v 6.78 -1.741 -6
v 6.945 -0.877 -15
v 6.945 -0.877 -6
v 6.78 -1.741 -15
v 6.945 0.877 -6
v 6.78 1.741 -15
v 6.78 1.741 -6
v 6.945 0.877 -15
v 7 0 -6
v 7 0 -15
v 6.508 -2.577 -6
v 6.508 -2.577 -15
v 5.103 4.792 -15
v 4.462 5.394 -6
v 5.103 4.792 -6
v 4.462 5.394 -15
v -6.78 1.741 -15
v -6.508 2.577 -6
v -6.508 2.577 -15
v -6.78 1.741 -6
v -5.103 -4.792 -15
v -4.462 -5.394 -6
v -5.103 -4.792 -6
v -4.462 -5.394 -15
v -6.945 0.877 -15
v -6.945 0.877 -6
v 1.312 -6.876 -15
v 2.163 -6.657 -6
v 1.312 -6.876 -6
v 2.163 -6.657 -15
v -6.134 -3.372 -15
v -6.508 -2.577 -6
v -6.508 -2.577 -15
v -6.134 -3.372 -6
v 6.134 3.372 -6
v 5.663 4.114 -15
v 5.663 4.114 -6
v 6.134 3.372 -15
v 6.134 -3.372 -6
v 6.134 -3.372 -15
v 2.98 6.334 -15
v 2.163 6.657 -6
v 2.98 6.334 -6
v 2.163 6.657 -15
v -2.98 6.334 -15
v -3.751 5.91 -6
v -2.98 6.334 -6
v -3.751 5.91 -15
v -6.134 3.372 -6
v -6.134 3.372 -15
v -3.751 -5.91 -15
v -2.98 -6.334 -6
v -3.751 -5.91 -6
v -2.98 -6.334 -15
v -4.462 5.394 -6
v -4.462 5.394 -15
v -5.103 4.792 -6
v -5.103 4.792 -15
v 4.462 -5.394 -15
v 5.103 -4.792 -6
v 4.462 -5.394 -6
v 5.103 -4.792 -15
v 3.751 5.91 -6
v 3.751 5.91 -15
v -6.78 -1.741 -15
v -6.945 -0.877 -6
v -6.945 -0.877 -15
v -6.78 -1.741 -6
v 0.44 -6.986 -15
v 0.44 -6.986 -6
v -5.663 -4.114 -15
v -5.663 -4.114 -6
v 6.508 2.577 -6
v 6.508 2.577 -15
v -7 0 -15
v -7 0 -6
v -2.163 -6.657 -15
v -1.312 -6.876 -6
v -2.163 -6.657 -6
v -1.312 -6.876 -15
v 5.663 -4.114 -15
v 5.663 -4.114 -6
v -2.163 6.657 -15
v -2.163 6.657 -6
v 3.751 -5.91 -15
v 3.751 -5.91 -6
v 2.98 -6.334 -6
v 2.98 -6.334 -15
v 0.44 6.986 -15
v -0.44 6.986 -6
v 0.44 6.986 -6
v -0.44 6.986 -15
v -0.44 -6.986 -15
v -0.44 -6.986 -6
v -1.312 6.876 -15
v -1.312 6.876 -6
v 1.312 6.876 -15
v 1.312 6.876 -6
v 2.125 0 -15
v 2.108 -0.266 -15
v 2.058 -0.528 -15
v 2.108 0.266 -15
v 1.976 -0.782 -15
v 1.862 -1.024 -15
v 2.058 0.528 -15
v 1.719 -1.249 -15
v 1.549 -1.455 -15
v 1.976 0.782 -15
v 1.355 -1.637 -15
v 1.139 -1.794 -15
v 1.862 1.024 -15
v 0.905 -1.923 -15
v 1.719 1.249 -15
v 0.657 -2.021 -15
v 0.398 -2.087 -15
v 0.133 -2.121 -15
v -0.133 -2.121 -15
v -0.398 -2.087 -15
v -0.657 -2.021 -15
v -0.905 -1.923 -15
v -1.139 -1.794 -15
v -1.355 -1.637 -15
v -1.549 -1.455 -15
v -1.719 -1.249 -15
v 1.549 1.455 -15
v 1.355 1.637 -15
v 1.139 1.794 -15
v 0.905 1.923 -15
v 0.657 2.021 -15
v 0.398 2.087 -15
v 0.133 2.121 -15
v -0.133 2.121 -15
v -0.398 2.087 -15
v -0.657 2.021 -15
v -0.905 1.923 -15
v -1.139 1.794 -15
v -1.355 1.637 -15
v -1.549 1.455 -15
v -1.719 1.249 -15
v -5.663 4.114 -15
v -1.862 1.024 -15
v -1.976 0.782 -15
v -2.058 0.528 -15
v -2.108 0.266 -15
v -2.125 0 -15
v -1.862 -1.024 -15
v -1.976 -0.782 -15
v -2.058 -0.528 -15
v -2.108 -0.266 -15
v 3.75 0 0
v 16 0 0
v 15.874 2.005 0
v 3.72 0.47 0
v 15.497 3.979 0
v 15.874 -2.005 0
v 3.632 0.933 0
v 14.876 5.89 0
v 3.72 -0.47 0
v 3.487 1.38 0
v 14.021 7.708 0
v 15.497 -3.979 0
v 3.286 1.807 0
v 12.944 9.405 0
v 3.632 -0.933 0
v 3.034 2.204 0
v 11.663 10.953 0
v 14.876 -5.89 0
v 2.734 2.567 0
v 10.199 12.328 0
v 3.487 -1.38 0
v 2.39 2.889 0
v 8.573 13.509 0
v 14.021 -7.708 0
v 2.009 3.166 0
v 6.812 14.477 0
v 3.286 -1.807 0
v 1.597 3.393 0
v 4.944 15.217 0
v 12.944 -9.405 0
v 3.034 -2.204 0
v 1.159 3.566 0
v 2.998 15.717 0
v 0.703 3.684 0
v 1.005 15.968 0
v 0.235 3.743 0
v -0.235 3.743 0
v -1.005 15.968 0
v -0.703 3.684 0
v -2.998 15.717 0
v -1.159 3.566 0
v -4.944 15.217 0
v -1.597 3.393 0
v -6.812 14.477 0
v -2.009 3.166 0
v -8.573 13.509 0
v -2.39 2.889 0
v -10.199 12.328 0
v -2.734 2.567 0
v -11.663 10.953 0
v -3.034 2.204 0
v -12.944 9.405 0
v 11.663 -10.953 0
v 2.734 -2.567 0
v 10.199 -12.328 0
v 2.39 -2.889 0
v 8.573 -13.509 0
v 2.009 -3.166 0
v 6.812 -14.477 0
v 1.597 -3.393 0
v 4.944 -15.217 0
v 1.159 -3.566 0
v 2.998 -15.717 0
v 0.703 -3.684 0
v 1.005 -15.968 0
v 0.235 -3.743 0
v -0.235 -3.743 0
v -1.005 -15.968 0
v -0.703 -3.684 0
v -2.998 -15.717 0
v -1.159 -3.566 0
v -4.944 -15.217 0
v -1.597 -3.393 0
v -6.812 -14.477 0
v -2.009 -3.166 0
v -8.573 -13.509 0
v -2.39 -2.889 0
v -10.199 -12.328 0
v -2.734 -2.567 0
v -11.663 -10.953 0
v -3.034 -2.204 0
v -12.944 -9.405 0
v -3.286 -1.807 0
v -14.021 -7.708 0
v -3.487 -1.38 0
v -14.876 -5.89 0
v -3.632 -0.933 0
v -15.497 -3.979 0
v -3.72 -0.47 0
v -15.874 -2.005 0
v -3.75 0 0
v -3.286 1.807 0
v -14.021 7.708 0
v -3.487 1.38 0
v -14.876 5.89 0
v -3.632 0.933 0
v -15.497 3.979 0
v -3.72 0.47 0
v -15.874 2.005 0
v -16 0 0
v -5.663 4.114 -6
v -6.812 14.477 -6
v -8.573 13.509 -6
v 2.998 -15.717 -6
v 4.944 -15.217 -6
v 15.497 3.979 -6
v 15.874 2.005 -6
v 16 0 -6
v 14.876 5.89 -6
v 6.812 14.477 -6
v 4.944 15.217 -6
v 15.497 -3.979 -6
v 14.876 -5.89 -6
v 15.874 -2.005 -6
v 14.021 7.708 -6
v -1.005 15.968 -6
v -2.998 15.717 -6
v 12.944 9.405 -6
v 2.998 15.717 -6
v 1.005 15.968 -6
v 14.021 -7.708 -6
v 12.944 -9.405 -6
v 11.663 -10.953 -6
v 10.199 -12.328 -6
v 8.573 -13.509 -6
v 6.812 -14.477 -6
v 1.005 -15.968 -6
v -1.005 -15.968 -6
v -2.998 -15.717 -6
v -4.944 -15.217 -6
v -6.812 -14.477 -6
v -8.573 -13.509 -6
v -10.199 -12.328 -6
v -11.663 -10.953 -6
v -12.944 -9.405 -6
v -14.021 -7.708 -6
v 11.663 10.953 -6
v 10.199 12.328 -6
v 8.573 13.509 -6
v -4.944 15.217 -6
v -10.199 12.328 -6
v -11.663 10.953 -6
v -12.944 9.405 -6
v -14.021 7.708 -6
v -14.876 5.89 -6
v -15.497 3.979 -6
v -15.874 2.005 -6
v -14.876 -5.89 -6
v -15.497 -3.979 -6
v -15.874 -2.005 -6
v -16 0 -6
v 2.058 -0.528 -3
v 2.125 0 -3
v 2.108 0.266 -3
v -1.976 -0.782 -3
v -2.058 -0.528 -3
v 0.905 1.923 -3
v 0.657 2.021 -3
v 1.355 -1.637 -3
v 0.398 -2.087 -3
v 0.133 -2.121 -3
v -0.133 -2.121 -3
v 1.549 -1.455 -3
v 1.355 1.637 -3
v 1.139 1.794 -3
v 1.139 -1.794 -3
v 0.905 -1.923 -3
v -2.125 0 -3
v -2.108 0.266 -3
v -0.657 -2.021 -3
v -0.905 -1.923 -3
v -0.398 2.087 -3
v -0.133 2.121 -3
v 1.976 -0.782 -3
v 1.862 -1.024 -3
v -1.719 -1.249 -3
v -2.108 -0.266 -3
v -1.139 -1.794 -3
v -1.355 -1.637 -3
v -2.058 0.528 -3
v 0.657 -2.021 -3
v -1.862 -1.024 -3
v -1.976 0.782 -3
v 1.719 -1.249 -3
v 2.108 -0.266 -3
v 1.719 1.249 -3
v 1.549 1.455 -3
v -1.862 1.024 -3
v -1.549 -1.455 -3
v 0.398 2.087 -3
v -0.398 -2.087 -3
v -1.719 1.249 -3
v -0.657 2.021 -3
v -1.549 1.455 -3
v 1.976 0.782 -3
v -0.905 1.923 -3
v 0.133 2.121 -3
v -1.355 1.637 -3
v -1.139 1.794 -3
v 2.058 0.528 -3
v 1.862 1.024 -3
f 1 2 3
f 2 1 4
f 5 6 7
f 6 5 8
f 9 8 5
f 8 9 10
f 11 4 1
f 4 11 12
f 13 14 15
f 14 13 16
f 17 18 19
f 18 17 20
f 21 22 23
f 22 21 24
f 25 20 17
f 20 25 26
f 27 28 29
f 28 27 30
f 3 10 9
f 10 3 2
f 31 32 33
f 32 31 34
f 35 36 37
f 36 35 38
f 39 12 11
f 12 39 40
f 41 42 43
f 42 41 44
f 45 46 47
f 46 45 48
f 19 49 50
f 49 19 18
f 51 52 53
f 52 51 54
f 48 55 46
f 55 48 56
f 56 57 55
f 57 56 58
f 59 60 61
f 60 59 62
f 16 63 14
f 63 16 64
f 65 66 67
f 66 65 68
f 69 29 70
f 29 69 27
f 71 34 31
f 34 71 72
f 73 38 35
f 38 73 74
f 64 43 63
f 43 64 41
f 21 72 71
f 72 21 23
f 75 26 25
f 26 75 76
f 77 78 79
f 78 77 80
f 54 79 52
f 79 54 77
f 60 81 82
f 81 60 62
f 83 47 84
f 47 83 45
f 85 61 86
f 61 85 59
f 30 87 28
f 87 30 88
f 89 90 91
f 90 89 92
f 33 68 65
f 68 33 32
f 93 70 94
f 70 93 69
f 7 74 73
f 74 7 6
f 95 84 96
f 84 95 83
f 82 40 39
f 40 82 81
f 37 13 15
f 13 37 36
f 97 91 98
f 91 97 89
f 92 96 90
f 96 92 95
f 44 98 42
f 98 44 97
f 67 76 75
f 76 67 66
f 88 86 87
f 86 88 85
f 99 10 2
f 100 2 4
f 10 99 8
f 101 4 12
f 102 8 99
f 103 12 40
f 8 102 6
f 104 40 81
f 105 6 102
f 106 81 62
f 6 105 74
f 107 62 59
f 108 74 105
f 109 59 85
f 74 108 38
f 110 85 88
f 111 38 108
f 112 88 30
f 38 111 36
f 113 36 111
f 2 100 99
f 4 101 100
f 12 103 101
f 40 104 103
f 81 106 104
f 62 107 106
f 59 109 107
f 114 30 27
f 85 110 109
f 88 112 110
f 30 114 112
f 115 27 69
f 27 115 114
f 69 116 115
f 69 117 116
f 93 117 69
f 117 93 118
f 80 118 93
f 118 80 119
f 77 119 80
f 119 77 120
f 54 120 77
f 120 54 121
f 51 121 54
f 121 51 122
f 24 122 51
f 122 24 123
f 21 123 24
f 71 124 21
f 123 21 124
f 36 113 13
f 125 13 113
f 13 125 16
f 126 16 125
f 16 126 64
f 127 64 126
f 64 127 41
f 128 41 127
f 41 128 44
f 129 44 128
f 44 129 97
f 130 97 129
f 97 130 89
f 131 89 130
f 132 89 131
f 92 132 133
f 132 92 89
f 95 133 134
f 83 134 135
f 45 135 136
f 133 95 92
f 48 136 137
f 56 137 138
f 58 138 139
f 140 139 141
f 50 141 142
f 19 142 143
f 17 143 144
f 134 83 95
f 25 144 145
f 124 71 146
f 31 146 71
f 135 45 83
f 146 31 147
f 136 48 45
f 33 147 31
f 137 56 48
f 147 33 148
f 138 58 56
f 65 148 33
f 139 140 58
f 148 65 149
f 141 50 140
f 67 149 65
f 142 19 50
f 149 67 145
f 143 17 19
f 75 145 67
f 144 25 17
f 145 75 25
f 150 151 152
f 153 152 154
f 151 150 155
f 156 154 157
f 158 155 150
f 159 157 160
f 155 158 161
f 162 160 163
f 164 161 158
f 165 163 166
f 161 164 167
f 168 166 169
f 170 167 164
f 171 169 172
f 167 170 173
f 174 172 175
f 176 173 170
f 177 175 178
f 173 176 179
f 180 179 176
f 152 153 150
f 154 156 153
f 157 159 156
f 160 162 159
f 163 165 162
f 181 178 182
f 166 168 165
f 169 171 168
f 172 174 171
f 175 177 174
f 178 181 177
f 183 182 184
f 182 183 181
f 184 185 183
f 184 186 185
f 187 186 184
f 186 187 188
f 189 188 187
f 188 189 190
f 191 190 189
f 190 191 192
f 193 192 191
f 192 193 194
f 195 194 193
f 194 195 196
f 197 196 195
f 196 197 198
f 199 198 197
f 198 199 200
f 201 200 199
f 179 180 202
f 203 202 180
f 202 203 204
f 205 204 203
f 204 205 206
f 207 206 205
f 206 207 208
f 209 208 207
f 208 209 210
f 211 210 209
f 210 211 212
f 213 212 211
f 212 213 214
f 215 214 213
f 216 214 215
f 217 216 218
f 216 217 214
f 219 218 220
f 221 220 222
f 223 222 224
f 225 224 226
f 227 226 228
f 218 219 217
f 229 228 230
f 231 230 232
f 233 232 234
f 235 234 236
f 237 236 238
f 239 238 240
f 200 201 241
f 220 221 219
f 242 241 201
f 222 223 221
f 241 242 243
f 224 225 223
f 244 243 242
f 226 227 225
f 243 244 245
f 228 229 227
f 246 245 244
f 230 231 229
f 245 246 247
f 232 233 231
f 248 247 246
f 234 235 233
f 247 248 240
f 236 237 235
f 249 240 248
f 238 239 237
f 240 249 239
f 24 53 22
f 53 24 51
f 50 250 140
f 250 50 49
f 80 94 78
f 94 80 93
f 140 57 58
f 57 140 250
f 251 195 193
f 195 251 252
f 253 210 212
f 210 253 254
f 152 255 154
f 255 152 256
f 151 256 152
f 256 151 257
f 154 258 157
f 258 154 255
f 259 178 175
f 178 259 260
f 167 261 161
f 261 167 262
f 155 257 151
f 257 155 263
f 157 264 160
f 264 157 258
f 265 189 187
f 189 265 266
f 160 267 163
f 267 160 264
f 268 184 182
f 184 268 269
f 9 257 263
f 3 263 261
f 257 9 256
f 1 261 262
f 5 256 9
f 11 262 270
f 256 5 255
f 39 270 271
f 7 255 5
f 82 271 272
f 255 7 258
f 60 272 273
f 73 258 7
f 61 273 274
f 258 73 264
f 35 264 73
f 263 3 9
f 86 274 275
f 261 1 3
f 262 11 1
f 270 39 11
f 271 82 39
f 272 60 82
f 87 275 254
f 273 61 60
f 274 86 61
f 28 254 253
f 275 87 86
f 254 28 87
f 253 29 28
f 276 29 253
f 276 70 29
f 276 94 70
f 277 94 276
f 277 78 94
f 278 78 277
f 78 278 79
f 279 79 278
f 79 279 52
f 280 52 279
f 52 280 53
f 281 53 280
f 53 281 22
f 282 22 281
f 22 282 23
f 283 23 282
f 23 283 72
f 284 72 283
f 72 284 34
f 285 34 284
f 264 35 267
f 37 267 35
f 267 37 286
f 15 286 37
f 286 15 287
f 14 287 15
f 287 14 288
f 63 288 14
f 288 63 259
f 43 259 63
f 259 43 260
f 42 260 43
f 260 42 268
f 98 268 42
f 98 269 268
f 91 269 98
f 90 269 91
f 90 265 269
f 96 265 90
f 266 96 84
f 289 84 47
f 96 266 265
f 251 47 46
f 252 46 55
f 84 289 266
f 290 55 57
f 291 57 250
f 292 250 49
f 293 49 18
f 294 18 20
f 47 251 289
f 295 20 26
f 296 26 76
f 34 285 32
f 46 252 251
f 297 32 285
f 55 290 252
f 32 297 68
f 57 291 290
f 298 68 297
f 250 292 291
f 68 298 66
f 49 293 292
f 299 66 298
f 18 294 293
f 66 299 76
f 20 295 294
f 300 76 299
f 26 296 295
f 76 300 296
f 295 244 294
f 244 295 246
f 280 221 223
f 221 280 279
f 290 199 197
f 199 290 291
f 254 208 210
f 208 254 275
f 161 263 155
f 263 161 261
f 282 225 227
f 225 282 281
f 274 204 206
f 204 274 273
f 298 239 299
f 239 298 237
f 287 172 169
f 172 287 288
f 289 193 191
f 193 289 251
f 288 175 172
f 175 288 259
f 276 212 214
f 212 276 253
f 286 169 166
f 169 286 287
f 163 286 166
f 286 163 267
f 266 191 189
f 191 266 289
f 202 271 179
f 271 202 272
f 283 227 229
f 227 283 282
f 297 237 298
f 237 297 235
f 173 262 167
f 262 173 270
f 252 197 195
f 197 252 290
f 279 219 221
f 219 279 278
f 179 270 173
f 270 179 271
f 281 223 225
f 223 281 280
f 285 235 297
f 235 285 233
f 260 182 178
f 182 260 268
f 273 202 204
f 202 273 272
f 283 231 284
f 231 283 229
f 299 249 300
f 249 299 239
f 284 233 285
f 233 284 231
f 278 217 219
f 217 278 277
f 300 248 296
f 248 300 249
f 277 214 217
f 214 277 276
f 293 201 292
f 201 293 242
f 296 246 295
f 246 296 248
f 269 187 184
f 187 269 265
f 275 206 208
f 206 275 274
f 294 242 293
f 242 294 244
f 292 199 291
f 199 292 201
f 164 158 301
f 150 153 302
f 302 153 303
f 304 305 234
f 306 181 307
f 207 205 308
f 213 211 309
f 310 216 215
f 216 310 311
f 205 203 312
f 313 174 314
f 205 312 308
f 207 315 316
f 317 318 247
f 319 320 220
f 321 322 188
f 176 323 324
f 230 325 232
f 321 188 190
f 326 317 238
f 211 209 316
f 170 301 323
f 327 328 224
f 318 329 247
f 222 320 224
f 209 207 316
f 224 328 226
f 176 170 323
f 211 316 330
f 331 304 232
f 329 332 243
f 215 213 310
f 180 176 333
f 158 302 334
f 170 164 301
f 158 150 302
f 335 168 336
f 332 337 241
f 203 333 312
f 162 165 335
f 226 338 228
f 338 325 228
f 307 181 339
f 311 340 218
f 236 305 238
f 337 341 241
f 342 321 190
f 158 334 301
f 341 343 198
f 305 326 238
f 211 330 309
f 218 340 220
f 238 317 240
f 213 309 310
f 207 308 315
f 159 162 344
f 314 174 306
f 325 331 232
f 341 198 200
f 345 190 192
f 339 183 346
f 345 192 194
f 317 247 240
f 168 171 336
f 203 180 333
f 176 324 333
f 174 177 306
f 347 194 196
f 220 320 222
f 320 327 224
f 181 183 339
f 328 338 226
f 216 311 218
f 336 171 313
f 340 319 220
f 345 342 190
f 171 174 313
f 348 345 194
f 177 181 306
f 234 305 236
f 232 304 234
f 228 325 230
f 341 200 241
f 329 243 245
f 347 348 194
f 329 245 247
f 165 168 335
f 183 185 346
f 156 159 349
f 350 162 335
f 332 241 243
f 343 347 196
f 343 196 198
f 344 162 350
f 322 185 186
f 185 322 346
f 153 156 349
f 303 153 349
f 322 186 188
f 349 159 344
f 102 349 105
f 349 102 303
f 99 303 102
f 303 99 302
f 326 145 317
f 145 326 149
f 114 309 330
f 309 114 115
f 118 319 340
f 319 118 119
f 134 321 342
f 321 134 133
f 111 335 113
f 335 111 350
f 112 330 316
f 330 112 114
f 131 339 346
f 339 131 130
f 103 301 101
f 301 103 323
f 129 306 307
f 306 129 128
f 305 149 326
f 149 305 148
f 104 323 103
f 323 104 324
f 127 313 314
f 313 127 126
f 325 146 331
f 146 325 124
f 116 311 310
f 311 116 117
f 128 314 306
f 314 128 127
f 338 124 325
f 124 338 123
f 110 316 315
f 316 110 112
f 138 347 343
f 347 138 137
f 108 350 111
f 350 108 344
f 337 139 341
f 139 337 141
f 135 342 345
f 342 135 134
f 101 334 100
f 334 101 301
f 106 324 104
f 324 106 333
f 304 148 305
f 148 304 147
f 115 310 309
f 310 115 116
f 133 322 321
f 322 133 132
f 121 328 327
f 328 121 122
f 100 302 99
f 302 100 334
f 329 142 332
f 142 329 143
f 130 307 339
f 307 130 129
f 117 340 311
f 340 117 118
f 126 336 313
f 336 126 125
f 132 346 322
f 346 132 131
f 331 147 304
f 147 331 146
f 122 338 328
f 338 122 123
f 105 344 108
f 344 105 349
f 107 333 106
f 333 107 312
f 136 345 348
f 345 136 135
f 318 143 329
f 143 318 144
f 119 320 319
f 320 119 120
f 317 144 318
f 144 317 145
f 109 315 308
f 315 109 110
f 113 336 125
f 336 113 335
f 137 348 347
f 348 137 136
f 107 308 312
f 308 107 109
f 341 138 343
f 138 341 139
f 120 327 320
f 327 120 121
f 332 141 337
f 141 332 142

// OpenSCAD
$fn = 50;


difference() {
	union() {
		translate(v = [0, 0, -15.0000000000]) {
			cylinder(h = 15, r = 7.0000000000);
		}
		translate(v = [0, 0, -6.0000000000]) {
			cylinder(h = 6, r = 16.0000000000);
		}
	}
	union() {
		translate(v = [0, 0, 0]) {
			rotate(a = [0, 0, 0]) {
				difference() {
					union() {
						#translate(v = [0, 0, -15.0000000000]) {
							cylinder(h = 15, r = 2.0000000000);
						}
						#translate(v = [0, 0, -3]) {
							cylinder(h = 3, r1 = 2.1250000000, r2 = 3.7500000000);
						}
						#translate(v = [0, 0, -15.0000000000]) {
							cylinder(h = 15, r = 2.1250000000);
						}
						#translate(v = [0, 0, -15.0000000000]) {
							cylinder(h = 15, r = 2.0000000000);
						}
					}
					union();
				}
			}
		}
	}
}
